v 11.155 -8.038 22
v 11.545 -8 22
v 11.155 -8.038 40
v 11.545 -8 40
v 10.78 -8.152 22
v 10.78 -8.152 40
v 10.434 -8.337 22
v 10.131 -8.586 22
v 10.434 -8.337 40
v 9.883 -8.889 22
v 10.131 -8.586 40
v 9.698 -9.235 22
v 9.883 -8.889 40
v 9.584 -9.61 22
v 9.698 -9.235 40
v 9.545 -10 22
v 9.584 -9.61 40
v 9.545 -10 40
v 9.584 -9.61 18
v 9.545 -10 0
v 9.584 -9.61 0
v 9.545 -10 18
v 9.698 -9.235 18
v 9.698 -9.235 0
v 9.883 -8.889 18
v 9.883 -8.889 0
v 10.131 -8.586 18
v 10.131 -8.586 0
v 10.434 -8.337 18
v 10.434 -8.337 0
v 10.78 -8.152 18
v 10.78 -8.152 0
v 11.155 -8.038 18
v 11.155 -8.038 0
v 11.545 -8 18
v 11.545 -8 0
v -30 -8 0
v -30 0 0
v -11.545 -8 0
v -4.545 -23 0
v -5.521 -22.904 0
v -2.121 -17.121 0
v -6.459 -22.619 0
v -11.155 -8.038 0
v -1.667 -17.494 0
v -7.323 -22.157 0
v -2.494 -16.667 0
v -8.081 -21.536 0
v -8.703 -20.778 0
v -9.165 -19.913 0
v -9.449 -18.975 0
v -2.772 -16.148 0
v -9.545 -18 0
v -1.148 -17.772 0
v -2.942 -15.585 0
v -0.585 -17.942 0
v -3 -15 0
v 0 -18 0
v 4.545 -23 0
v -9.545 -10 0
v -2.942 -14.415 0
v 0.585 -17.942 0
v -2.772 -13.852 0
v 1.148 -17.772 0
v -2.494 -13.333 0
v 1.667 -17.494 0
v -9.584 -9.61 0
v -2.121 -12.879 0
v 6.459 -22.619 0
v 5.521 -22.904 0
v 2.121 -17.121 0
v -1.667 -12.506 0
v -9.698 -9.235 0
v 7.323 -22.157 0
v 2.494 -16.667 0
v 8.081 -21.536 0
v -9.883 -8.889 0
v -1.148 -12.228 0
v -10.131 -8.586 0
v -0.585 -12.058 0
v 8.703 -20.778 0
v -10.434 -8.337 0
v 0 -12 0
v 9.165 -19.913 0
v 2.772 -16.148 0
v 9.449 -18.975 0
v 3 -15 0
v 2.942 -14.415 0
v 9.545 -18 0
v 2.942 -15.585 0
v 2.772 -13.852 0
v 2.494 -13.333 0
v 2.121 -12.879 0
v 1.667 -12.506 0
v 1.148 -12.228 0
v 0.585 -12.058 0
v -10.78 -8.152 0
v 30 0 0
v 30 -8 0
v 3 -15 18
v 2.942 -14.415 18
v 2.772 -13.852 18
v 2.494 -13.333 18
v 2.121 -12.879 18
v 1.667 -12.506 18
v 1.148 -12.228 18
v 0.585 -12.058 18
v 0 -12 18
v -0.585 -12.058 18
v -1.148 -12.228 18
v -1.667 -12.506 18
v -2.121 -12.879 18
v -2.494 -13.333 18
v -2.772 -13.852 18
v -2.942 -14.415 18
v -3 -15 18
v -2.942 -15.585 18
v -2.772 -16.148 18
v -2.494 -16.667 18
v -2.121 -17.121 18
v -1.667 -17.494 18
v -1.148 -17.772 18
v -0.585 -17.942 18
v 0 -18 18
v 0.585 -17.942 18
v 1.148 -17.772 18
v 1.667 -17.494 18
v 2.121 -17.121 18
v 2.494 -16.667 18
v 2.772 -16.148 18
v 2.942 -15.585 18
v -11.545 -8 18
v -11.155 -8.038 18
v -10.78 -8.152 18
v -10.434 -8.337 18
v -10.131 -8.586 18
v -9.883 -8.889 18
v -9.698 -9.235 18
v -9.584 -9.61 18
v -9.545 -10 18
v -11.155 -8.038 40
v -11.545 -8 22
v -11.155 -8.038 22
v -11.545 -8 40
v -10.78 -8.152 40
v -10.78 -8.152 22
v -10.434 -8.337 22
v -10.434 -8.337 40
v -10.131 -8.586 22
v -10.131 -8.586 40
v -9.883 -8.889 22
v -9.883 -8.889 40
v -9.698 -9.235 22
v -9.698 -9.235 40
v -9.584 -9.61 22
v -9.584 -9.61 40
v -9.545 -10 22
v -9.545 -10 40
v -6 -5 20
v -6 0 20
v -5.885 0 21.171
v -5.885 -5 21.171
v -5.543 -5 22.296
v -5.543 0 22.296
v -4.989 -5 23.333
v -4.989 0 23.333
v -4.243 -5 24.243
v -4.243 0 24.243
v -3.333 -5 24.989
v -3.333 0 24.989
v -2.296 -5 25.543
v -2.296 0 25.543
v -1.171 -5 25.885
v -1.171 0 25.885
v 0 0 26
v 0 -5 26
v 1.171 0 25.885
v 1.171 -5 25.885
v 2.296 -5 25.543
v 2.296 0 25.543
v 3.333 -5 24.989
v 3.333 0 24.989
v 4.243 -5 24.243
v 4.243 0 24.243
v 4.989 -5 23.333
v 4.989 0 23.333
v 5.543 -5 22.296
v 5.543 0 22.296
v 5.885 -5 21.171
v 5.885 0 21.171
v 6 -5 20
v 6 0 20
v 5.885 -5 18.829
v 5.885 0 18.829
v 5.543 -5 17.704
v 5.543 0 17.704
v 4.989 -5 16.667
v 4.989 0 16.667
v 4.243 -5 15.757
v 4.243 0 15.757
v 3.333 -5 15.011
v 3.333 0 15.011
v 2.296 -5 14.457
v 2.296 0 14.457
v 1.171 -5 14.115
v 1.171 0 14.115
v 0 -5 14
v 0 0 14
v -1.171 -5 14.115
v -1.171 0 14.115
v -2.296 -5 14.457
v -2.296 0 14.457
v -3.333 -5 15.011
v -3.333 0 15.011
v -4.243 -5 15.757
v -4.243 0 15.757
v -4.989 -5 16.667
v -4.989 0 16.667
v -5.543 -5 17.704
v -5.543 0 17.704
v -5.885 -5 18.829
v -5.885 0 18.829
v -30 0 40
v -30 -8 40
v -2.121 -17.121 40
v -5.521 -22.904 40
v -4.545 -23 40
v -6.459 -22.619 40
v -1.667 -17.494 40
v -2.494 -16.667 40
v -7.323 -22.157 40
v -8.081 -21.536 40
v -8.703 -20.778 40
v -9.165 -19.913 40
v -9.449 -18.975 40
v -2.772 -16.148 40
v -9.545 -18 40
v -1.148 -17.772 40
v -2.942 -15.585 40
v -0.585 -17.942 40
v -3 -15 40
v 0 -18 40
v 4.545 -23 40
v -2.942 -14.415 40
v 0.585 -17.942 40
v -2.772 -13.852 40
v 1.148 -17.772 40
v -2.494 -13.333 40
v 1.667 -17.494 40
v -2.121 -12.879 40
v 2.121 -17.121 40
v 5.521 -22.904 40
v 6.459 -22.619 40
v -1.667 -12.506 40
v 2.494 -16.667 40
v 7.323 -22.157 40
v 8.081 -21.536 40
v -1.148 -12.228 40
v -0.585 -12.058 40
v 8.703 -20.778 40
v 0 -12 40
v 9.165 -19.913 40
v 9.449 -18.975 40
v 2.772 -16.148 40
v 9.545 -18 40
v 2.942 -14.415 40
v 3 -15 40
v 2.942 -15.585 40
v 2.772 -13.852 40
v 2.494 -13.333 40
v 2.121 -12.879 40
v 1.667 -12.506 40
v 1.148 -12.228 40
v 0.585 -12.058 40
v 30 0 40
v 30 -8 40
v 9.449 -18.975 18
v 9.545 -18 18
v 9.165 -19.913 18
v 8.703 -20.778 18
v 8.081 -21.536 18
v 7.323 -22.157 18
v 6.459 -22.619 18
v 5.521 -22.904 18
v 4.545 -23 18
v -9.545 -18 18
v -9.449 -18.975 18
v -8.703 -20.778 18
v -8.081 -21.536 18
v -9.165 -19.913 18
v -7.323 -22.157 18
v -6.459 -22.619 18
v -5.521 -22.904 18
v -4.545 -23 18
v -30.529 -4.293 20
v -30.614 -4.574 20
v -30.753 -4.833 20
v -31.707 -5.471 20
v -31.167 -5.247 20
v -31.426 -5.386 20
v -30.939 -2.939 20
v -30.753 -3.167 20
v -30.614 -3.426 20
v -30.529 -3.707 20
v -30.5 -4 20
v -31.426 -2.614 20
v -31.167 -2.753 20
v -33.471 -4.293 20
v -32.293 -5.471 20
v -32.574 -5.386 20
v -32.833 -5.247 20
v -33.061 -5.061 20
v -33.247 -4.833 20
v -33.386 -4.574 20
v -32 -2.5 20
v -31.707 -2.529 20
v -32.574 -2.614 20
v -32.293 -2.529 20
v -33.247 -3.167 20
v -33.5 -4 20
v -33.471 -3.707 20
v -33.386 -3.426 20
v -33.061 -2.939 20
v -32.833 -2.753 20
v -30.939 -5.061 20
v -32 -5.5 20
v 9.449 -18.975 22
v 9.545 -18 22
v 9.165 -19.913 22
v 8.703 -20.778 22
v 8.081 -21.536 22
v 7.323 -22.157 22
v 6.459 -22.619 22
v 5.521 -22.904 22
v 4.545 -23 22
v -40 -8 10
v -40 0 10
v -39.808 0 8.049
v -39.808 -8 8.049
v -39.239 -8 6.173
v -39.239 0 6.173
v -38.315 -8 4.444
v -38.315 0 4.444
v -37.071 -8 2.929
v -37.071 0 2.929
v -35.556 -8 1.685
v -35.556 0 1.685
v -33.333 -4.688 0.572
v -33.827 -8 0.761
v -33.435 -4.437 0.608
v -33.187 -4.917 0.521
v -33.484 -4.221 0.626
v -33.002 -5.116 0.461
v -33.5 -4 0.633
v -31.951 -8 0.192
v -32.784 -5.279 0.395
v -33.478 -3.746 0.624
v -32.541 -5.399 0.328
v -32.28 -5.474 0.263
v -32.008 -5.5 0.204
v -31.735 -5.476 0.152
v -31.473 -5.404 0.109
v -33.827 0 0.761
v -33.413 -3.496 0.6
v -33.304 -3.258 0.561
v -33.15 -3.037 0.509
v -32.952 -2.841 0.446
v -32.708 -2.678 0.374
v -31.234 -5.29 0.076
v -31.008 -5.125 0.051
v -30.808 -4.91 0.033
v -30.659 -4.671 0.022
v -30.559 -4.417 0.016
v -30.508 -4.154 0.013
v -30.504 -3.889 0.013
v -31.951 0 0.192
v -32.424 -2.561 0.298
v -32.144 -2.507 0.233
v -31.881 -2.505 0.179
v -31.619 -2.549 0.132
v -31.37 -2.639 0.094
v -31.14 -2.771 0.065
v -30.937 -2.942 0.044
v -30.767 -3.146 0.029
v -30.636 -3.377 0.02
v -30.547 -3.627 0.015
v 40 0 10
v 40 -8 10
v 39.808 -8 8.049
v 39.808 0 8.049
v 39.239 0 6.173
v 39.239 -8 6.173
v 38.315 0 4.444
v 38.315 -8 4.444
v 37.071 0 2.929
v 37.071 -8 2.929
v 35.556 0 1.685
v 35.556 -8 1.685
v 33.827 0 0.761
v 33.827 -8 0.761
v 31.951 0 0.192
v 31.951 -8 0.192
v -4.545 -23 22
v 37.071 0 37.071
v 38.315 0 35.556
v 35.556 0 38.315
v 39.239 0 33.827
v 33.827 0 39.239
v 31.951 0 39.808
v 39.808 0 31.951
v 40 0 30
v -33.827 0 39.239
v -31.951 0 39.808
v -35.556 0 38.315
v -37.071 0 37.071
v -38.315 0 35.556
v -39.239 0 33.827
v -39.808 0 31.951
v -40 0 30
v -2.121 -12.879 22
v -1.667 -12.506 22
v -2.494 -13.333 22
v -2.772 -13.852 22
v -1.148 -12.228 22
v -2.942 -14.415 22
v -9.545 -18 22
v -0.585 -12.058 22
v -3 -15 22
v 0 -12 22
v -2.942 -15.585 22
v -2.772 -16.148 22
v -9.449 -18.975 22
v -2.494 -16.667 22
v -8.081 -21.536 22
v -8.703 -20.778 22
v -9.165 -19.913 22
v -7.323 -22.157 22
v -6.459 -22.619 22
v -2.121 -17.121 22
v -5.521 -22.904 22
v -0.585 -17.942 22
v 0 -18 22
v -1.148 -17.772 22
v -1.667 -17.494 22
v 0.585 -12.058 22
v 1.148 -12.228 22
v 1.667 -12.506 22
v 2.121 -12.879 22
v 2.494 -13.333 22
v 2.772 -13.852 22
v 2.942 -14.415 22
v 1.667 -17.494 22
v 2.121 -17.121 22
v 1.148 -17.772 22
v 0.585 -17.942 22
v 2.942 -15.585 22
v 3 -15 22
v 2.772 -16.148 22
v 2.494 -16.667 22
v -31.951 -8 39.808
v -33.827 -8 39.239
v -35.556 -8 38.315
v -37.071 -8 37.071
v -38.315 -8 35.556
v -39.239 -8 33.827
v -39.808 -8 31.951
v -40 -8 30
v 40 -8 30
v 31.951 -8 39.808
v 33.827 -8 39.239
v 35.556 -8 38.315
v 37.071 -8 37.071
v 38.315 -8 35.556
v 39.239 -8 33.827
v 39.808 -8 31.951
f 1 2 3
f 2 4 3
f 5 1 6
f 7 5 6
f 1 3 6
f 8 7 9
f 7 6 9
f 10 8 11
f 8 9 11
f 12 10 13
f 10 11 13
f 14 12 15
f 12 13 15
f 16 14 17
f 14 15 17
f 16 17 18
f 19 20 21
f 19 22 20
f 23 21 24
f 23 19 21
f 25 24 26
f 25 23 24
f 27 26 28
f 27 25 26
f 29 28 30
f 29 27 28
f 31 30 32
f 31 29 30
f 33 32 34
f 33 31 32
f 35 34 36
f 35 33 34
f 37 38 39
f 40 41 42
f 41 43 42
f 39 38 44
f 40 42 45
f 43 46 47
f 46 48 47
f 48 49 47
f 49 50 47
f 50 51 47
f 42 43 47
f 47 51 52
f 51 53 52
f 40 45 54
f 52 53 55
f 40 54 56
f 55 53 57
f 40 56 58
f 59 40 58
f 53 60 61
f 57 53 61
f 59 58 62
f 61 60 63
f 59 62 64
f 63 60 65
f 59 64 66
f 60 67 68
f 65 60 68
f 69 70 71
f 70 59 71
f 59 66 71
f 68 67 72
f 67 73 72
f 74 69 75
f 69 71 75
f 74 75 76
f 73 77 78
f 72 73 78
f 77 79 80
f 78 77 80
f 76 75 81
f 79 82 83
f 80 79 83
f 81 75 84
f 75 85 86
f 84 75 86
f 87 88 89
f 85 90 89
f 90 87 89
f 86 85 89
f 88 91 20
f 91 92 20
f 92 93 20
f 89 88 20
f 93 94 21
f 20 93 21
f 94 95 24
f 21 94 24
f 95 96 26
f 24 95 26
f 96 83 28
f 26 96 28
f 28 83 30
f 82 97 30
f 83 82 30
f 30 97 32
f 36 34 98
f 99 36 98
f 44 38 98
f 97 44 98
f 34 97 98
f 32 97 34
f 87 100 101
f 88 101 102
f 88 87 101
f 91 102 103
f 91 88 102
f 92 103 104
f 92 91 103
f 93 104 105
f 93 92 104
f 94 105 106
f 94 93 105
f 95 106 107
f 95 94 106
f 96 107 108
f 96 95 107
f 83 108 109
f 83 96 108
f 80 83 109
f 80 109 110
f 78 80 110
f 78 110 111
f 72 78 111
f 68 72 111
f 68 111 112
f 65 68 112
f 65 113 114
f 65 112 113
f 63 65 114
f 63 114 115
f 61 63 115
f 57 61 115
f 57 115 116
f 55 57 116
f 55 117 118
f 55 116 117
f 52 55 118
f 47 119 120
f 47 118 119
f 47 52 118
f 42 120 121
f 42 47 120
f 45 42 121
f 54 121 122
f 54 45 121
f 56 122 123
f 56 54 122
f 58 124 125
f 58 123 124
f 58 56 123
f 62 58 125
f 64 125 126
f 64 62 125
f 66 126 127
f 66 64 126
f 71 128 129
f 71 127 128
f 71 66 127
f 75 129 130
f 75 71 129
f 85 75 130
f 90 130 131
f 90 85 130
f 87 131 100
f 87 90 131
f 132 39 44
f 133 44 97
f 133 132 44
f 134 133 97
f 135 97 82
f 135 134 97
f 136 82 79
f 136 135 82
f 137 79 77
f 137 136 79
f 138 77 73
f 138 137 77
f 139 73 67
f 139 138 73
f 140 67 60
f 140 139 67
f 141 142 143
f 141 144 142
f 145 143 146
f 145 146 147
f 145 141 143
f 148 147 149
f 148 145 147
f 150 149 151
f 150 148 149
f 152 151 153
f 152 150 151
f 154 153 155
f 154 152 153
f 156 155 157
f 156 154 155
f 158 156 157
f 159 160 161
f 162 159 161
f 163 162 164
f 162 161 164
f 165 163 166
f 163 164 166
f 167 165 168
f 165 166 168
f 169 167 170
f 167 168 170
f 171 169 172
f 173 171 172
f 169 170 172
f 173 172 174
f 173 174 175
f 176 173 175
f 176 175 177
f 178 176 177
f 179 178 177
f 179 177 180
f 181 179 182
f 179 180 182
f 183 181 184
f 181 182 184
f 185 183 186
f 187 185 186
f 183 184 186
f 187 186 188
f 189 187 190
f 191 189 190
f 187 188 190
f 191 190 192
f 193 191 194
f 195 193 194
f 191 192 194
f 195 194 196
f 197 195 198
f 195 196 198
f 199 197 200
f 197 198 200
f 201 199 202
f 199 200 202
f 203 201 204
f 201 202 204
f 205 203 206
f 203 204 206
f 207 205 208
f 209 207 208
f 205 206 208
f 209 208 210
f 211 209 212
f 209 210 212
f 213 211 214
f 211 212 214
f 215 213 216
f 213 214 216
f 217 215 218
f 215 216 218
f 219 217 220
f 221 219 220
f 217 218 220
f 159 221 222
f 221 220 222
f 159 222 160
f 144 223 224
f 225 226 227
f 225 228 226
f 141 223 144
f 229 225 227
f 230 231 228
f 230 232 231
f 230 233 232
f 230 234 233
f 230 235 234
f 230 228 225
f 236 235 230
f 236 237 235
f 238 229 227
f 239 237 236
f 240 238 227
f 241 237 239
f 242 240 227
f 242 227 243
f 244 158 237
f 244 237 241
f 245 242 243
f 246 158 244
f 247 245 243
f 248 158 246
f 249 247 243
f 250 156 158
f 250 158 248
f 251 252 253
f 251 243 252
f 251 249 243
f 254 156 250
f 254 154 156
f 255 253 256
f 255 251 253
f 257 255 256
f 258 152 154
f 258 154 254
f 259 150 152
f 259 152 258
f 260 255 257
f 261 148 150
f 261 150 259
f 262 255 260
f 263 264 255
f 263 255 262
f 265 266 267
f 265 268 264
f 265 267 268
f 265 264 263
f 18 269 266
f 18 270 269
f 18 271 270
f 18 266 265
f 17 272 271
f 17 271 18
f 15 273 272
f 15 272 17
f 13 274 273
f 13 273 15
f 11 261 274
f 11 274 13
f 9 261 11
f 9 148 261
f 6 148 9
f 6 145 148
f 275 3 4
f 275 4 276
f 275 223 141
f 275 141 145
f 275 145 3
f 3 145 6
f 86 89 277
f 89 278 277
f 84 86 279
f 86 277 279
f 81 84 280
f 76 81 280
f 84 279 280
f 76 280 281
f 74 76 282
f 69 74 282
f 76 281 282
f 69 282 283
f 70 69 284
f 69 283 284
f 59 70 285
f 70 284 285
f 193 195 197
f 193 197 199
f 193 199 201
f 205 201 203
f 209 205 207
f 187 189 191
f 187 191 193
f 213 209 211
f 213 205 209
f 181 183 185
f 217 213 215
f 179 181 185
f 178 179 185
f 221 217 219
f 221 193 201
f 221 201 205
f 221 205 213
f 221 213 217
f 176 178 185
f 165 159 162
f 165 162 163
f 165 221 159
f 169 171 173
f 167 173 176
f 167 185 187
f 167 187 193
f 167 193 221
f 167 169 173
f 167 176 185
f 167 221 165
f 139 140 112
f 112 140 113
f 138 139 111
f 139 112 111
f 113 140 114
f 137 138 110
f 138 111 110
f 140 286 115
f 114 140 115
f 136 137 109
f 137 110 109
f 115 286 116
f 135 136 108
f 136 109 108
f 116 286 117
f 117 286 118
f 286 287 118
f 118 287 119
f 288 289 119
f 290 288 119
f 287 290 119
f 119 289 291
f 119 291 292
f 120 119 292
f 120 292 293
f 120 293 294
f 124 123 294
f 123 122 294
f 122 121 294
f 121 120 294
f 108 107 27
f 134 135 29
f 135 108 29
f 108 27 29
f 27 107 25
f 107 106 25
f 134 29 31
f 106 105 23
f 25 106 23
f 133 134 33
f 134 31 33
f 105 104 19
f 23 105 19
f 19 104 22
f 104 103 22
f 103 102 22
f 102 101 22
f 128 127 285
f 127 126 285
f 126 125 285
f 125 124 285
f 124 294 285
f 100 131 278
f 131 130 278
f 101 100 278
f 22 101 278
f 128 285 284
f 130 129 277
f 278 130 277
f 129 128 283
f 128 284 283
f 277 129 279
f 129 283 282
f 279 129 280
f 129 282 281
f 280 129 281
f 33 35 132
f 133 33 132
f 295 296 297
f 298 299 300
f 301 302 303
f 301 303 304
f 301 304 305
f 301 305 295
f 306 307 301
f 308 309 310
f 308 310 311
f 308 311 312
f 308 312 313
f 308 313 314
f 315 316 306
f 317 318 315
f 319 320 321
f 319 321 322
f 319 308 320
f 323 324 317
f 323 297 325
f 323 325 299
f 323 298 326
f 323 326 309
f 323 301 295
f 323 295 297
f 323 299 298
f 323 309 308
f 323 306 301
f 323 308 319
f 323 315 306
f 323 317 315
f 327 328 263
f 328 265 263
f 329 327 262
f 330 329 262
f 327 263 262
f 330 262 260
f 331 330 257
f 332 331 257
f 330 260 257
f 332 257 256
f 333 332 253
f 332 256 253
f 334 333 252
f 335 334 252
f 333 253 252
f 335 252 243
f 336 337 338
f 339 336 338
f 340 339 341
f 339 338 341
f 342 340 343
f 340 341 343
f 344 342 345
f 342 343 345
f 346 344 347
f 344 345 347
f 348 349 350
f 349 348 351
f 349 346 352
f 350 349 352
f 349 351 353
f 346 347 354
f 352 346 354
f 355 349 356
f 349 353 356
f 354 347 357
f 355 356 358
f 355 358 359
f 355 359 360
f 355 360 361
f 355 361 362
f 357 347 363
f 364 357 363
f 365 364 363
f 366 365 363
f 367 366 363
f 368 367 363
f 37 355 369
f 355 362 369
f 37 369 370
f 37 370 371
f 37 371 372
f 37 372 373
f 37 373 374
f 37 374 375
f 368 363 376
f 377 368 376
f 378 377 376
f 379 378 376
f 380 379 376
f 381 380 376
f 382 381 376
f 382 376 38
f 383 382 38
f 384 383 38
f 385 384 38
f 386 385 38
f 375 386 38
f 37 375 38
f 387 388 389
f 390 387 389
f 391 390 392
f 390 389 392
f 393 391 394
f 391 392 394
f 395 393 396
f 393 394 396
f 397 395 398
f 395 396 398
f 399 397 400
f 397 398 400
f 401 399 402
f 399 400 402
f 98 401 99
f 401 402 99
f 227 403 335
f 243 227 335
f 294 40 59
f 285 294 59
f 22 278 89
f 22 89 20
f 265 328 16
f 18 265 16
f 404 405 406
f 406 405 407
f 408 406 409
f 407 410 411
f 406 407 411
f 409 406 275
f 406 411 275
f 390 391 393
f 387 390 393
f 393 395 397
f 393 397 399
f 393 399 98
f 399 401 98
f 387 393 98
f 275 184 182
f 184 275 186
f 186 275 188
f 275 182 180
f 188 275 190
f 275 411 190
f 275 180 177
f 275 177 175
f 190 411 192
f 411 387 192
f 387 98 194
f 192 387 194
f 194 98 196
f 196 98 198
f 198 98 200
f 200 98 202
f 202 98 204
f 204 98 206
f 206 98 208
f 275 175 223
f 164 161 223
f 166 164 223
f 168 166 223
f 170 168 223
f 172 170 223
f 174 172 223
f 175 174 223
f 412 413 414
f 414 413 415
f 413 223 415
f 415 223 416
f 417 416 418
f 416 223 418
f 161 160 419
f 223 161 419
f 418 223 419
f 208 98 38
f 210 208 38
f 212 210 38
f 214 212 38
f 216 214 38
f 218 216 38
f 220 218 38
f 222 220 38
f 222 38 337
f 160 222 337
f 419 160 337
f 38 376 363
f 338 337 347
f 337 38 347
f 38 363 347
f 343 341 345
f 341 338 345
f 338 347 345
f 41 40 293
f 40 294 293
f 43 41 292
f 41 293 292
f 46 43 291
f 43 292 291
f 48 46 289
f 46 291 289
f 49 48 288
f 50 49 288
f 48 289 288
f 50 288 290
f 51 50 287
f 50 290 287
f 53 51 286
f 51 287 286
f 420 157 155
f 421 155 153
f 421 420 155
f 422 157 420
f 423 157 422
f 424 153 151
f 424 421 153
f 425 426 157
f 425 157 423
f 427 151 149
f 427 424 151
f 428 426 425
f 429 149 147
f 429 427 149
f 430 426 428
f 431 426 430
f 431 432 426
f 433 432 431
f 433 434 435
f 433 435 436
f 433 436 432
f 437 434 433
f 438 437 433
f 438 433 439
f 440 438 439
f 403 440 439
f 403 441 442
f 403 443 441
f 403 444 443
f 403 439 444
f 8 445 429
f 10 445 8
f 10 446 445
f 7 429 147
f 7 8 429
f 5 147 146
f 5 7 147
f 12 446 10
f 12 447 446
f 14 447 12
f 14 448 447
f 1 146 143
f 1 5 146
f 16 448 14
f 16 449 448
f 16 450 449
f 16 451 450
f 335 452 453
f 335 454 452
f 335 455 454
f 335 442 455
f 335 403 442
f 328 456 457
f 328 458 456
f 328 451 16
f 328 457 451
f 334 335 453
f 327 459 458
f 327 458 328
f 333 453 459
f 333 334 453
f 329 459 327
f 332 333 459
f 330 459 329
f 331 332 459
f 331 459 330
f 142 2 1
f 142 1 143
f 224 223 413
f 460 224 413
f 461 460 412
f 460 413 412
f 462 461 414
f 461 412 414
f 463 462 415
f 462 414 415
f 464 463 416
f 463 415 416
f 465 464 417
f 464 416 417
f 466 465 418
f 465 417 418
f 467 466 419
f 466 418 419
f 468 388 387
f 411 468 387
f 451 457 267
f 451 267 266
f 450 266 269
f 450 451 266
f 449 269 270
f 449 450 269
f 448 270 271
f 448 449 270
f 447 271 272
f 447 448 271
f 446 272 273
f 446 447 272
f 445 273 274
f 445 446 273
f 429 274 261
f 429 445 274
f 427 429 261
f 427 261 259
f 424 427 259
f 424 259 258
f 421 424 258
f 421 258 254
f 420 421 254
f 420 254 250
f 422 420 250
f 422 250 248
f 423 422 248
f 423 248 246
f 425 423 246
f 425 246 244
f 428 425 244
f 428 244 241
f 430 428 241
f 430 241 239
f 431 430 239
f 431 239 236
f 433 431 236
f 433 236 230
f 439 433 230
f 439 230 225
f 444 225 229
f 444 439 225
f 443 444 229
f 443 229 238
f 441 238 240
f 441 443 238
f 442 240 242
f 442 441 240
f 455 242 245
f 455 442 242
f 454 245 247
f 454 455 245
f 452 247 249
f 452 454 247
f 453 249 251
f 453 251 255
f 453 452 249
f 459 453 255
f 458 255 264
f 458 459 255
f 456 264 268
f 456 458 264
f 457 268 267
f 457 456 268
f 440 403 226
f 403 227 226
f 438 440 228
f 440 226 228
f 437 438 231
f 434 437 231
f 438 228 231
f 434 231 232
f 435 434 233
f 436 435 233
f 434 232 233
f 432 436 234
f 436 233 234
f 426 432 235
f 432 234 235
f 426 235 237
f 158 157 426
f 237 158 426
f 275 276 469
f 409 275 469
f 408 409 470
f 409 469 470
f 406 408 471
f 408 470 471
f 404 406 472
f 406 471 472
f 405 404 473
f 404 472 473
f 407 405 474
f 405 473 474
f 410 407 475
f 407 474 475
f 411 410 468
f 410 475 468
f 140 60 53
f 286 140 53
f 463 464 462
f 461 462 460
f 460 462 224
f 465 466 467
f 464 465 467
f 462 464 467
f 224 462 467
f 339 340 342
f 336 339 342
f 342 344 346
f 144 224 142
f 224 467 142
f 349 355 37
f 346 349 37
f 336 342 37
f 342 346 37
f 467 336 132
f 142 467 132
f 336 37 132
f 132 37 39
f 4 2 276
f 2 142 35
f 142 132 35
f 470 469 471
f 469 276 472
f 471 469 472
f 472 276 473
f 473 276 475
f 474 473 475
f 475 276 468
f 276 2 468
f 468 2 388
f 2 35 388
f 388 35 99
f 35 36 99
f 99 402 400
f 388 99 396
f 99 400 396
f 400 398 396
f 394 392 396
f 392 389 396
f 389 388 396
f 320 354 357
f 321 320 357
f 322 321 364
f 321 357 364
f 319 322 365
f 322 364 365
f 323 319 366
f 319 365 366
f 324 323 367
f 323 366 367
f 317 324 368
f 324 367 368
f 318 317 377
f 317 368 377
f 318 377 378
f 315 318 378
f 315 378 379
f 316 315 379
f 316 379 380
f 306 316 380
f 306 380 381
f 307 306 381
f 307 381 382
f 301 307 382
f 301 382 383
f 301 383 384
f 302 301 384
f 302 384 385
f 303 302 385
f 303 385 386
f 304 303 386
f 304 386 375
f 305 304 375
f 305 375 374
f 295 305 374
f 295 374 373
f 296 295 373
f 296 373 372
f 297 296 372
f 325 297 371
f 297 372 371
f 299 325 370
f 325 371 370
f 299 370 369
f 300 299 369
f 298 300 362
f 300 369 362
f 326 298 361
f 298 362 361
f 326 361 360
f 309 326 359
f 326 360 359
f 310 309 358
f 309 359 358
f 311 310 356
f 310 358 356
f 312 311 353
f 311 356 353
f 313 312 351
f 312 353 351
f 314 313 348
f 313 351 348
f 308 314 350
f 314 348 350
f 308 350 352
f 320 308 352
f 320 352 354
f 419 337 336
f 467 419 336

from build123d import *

# Parameters (mm, degrees)
SKETCH1_R           = 3
BOSS_EXTRUDE1_DEPTH = 40
SKETCH2_R           = 1.5
CUT_EXTRUDE1_DEPTH  = 20
SKETCH6_W           = 80
SKETCH6_H           = 4
CUT_EXTRUDE4_DEPTH  = 15
FILLET1_R           = 10
FILLET2_R           = 5
FILLET3_R           = 2
SKETCH7_R           = 6
CUT_EXTRUDE5_DEPTH  = 5


with BuildPart() as part:
    # Sketch1 → Boss-Extrude1 (new body)
    with BuildSketch(Plane.XY):
        Polygon((40, 0), (-40, 0), (-40, -8), (-9.545454545, -8), (-9.545454545, -23), (9.545454545, -23), (9.545454545, -8), (40, -8), align=None)
        with Locations((0, -15)):
            Circle(SKETCH1_R, mode=Mode.SUBTRACT)
    extrude(amount=BOSS_EXTRUDE1_DEPTH)

    # Sketch2 → Cut-Extrude1 (cut)
    with BuildSketch(Plane(origin=(0, 0, 0), x_dir=(-1, 0, 0), z_dir=(0, 0, -1))):
        with Locations((32, -4)):
            Circle(SKETCH2_R)
    extrude(amount=-CUT_EXTRUDE1_DEPTH, mode=Mode.SUBTRACT)

    # Sketch6 → Cut-Extrude4 (cut)
    with BuildSketch(Plane.XZ.offset(23)):
        with Locations((0, 20)):
            Rectangle(SKETCH6_W, SKETCH6_H)
    extrude(amount=-CUT_EXTRUDE4_DEPTH, mode=Mode.SUBTRACT)

    # Fillet1
    # the kernel refuses this fillet: 10 mm, written as the material it takes off along each edge
    with BuildSketch(Plane(origin=(40, -33, 40), x_dir=(-1, 0, 0), z_dir=(0, 1, 0)), Plane(origin=(-40, 25, 40), x_dir=(1, 0, 0), z_dir=(0, -1, 0))) as fillet1_piece_1:
        with BuildLine():
            CenterArc((FILLET1_R, -FILLET1_R), FILLET1_R, 90, 90)
            Line((0, -FILLET1_R), (0, 0))
            Line((0, 0), (FILLET1_R, 0))
        make_face()
    extrude(amount=58, mode=Mode.SUBTRACT)
    with BuildSketch(Plane(origin=(-40, 25, 0), x_dir=(1, 0, 0), z_dir=(0, -1, 0)), Plane(origin=(40, -33, 0), x_dir=(-1, 0, 0), z_dir=(0, 1, 0))) as fillet1_piece_2:
        with BuildLine():
            CenterArc((FILLET1_R, FILLET1_R), FILLET1_R, 180, 90)
            Line((0, FILLET1_R), (0, 0))
            Line((0, 0), (FILLET1_R, 0))
        make_face()
    extrude(amount=58, mode=Mode.SUBTRACT)

    # Fillet2
    fillet2_edges = [part.edges().sort_by_distance(p)[0] for p in [
        (9.545454545, -23, 31),
        (-9.545454545, -23, 31),
        (9.545454545, -23, 9),
        (-9.545454545, -23, 9),
    ]]
    fillet(fillet2_edges, radius=FILLET2_R)

    # Fillet3
    fillet3_edges = [part.edges().sort_by_distance(p)[0] for p in [
        (9.545454545, -8, 31),
        (-9.545454545, -8, 31),
        (9.545454545, -8, 9),
        (-9.545454545, -8, 9),
    ]]
    fillet(fillet3_edges, radius=FILLET3_R)

    # Sketch7 → Cut-Extrude5 (cut)
    with BuildSketch(Plane(origin=(0, 0, 0), x_dir=(1, 0, 0), z_dir=(0, 1, 0))):
        with Locations(Location((0, -20, 0), (0, 0, 180))):
            Circle(SKETCH7_R)
    extrude(amount=-CUT_EXTRUDE5_DEPTH, mode=Mode.SUBTRACT)


solid = part.part
